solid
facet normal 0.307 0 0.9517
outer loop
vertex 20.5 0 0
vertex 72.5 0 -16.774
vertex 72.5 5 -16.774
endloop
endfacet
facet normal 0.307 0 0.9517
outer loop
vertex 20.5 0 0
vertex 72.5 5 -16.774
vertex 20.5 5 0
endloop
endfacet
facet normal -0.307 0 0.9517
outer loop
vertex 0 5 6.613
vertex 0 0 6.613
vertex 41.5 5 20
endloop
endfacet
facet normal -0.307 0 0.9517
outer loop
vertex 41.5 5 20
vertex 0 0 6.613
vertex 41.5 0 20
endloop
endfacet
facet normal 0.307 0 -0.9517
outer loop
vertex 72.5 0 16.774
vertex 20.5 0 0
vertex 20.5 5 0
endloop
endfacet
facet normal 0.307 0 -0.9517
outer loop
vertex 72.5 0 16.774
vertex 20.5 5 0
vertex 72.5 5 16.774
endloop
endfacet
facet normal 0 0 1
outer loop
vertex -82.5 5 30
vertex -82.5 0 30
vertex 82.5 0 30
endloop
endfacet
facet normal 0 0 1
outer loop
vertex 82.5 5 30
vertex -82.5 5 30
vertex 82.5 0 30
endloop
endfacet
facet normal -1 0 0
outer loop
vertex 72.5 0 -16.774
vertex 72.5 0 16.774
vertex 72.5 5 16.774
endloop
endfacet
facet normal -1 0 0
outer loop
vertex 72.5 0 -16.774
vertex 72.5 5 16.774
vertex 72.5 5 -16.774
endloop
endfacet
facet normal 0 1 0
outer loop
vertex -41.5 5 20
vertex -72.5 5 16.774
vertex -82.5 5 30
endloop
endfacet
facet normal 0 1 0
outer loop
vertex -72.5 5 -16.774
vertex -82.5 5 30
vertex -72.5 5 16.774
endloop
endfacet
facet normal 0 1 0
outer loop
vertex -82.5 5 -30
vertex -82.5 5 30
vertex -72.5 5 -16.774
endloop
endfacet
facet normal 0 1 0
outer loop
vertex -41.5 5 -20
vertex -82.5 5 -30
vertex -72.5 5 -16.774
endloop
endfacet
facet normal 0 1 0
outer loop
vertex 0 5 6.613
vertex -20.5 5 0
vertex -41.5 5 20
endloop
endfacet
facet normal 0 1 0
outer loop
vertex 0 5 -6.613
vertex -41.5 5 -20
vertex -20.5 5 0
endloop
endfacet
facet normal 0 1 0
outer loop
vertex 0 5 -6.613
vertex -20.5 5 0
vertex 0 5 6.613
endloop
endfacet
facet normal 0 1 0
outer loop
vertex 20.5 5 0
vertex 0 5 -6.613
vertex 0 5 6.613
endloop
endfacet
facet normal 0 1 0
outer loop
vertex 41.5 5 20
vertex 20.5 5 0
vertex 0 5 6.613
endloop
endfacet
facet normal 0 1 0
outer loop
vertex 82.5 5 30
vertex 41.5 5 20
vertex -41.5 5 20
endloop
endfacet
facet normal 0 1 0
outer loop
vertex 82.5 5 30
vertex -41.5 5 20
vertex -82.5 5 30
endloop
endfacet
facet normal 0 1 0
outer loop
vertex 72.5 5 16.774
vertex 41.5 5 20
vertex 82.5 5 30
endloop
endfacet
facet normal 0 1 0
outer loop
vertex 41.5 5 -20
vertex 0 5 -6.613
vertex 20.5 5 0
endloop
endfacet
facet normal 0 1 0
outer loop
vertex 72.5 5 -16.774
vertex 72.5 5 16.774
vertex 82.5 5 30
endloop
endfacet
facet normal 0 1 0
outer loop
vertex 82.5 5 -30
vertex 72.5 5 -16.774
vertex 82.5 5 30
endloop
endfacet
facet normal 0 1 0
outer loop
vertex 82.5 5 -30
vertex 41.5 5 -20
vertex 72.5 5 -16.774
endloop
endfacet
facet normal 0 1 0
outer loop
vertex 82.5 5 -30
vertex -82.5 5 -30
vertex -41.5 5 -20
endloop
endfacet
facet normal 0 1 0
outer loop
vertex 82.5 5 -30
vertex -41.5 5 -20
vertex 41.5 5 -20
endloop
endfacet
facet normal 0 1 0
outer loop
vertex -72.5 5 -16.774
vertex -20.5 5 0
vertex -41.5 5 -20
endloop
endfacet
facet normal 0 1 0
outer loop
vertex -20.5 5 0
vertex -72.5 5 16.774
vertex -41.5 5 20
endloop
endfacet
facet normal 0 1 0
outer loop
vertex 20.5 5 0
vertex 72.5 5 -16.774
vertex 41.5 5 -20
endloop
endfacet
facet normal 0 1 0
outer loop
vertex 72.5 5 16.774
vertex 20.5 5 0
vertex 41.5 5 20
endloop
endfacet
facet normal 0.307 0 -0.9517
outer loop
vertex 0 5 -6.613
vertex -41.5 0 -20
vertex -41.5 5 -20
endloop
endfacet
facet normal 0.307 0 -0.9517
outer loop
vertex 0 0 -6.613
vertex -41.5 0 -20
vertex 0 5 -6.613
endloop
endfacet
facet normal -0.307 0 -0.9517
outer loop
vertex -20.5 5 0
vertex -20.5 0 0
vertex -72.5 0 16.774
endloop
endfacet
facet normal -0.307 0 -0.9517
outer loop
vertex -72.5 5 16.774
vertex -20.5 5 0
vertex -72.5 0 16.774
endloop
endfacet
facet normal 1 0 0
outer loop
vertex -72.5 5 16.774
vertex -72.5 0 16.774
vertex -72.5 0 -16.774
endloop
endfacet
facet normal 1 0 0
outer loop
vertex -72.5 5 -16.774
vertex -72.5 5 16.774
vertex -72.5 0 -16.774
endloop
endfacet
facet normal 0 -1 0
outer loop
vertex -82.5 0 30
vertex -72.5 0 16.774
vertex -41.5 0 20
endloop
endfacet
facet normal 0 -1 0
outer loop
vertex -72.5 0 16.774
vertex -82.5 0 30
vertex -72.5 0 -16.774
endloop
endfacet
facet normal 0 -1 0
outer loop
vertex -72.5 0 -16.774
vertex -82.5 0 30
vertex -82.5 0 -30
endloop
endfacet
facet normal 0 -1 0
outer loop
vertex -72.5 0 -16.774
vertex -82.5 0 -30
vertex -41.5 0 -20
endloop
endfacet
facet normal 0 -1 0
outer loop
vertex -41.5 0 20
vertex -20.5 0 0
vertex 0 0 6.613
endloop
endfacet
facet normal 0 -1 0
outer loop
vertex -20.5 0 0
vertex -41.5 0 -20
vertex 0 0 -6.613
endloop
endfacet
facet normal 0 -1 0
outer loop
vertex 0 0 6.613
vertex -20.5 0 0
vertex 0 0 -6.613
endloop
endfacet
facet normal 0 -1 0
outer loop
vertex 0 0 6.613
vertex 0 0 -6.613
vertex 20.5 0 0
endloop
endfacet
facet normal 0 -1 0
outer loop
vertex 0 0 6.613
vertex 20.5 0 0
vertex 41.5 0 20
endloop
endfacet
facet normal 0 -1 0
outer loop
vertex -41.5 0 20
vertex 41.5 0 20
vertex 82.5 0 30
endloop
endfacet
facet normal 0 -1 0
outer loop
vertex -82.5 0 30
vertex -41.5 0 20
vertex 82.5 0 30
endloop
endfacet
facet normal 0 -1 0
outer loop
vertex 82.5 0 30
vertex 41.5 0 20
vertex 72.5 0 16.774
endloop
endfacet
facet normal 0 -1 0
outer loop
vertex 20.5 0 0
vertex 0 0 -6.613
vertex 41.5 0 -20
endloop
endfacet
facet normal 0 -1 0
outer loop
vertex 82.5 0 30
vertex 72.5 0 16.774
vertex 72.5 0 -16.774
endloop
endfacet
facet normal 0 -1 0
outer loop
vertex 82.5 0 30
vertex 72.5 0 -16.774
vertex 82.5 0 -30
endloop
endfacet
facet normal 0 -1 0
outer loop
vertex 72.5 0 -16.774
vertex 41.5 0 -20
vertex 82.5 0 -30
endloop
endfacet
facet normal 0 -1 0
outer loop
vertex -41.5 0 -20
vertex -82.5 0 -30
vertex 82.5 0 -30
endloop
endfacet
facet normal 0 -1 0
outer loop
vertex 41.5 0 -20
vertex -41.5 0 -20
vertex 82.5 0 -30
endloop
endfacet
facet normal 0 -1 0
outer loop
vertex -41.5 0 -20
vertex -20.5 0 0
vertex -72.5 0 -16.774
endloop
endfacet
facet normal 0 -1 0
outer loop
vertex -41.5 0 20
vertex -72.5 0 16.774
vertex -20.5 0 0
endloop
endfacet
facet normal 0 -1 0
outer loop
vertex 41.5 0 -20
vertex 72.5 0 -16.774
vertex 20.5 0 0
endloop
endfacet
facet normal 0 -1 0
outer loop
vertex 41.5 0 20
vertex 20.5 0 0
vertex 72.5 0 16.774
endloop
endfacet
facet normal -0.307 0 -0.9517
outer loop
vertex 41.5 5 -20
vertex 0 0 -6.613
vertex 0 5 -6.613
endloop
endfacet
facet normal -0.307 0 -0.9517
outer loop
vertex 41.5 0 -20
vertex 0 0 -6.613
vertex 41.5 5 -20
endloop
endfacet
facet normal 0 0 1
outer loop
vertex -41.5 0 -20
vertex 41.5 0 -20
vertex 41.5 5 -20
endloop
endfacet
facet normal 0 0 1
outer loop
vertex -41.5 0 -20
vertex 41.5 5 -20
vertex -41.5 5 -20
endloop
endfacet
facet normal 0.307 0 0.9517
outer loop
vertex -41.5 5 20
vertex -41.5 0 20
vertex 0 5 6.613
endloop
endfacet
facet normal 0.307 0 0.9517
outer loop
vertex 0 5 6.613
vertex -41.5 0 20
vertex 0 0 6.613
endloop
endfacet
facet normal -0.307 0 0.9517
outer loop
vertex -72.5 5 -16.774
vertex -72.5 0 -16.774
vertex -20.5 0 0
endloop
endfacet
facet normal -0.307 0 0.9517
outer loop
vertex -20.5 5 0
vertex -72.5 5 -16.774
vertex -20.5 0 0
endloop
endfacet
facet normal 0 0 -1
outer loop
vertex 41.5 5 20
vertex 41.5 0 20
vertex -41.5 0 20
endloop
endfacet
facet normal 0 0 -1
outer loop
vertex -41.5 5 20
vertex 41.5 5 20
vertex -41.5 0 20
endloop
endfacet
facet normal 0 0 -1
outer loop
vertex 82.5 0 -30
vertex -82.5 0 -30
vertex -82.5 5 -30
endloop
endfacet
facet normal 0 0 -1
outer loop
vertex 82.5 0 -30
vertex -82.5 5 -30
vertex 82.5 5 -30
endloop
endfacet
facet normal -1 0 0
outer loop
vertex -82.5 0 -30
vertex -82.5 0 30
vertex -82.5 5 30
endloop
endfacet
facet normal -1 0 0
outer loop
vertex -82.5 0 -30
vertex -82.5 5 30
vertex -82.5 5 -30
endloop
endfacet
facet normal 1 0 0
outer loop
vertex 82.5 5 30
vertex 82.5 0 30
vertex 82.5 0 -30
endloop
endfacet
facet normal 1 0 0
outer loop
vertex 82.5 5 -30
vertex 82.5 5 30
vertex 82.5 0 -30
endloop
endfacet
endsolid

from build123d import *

# Parameters (mm, degrees)
SKETCH1_W           = 165
SKETCH1_H           = 60
BOSS_EXTRUDE1_DEPTH = 5


with BuildPart() as part:
    # Sketch1 → Boss-Extrude1 (new body)
    with BuildSketch(Plane(origin=(0, 0, 0), x_dir=(1, 0, 0), z_dir=(0, 1, 0))):
        Rectangle(SKETCH1_W, SKETCH1_H)
        Polygon((-72.5, 16.774193548), (-20.5, 0), (-72.5, -16.774193548), align=None, mode=Mode.SUBTRACT)
        Polygon((-41.5, 19.999999898), (0, 6.612903124), (41.5, 19.999999898), align=None, mode=Mode.SUBTRACT)
        Polygon((72.5, 16.774193548), (20.5, 0), (72.5, -16.774193548), align=None, mode=Mode.SUBTRACT)
        Polygon((0, -6.612903124), (41.5, -19.999999898), (-41.5, -19.999999898), align=None, mode=Mode.SUBTRACT)
    extrude(amount=BOSS_EXTRUDE1_DEPTH)


solid = part.part
